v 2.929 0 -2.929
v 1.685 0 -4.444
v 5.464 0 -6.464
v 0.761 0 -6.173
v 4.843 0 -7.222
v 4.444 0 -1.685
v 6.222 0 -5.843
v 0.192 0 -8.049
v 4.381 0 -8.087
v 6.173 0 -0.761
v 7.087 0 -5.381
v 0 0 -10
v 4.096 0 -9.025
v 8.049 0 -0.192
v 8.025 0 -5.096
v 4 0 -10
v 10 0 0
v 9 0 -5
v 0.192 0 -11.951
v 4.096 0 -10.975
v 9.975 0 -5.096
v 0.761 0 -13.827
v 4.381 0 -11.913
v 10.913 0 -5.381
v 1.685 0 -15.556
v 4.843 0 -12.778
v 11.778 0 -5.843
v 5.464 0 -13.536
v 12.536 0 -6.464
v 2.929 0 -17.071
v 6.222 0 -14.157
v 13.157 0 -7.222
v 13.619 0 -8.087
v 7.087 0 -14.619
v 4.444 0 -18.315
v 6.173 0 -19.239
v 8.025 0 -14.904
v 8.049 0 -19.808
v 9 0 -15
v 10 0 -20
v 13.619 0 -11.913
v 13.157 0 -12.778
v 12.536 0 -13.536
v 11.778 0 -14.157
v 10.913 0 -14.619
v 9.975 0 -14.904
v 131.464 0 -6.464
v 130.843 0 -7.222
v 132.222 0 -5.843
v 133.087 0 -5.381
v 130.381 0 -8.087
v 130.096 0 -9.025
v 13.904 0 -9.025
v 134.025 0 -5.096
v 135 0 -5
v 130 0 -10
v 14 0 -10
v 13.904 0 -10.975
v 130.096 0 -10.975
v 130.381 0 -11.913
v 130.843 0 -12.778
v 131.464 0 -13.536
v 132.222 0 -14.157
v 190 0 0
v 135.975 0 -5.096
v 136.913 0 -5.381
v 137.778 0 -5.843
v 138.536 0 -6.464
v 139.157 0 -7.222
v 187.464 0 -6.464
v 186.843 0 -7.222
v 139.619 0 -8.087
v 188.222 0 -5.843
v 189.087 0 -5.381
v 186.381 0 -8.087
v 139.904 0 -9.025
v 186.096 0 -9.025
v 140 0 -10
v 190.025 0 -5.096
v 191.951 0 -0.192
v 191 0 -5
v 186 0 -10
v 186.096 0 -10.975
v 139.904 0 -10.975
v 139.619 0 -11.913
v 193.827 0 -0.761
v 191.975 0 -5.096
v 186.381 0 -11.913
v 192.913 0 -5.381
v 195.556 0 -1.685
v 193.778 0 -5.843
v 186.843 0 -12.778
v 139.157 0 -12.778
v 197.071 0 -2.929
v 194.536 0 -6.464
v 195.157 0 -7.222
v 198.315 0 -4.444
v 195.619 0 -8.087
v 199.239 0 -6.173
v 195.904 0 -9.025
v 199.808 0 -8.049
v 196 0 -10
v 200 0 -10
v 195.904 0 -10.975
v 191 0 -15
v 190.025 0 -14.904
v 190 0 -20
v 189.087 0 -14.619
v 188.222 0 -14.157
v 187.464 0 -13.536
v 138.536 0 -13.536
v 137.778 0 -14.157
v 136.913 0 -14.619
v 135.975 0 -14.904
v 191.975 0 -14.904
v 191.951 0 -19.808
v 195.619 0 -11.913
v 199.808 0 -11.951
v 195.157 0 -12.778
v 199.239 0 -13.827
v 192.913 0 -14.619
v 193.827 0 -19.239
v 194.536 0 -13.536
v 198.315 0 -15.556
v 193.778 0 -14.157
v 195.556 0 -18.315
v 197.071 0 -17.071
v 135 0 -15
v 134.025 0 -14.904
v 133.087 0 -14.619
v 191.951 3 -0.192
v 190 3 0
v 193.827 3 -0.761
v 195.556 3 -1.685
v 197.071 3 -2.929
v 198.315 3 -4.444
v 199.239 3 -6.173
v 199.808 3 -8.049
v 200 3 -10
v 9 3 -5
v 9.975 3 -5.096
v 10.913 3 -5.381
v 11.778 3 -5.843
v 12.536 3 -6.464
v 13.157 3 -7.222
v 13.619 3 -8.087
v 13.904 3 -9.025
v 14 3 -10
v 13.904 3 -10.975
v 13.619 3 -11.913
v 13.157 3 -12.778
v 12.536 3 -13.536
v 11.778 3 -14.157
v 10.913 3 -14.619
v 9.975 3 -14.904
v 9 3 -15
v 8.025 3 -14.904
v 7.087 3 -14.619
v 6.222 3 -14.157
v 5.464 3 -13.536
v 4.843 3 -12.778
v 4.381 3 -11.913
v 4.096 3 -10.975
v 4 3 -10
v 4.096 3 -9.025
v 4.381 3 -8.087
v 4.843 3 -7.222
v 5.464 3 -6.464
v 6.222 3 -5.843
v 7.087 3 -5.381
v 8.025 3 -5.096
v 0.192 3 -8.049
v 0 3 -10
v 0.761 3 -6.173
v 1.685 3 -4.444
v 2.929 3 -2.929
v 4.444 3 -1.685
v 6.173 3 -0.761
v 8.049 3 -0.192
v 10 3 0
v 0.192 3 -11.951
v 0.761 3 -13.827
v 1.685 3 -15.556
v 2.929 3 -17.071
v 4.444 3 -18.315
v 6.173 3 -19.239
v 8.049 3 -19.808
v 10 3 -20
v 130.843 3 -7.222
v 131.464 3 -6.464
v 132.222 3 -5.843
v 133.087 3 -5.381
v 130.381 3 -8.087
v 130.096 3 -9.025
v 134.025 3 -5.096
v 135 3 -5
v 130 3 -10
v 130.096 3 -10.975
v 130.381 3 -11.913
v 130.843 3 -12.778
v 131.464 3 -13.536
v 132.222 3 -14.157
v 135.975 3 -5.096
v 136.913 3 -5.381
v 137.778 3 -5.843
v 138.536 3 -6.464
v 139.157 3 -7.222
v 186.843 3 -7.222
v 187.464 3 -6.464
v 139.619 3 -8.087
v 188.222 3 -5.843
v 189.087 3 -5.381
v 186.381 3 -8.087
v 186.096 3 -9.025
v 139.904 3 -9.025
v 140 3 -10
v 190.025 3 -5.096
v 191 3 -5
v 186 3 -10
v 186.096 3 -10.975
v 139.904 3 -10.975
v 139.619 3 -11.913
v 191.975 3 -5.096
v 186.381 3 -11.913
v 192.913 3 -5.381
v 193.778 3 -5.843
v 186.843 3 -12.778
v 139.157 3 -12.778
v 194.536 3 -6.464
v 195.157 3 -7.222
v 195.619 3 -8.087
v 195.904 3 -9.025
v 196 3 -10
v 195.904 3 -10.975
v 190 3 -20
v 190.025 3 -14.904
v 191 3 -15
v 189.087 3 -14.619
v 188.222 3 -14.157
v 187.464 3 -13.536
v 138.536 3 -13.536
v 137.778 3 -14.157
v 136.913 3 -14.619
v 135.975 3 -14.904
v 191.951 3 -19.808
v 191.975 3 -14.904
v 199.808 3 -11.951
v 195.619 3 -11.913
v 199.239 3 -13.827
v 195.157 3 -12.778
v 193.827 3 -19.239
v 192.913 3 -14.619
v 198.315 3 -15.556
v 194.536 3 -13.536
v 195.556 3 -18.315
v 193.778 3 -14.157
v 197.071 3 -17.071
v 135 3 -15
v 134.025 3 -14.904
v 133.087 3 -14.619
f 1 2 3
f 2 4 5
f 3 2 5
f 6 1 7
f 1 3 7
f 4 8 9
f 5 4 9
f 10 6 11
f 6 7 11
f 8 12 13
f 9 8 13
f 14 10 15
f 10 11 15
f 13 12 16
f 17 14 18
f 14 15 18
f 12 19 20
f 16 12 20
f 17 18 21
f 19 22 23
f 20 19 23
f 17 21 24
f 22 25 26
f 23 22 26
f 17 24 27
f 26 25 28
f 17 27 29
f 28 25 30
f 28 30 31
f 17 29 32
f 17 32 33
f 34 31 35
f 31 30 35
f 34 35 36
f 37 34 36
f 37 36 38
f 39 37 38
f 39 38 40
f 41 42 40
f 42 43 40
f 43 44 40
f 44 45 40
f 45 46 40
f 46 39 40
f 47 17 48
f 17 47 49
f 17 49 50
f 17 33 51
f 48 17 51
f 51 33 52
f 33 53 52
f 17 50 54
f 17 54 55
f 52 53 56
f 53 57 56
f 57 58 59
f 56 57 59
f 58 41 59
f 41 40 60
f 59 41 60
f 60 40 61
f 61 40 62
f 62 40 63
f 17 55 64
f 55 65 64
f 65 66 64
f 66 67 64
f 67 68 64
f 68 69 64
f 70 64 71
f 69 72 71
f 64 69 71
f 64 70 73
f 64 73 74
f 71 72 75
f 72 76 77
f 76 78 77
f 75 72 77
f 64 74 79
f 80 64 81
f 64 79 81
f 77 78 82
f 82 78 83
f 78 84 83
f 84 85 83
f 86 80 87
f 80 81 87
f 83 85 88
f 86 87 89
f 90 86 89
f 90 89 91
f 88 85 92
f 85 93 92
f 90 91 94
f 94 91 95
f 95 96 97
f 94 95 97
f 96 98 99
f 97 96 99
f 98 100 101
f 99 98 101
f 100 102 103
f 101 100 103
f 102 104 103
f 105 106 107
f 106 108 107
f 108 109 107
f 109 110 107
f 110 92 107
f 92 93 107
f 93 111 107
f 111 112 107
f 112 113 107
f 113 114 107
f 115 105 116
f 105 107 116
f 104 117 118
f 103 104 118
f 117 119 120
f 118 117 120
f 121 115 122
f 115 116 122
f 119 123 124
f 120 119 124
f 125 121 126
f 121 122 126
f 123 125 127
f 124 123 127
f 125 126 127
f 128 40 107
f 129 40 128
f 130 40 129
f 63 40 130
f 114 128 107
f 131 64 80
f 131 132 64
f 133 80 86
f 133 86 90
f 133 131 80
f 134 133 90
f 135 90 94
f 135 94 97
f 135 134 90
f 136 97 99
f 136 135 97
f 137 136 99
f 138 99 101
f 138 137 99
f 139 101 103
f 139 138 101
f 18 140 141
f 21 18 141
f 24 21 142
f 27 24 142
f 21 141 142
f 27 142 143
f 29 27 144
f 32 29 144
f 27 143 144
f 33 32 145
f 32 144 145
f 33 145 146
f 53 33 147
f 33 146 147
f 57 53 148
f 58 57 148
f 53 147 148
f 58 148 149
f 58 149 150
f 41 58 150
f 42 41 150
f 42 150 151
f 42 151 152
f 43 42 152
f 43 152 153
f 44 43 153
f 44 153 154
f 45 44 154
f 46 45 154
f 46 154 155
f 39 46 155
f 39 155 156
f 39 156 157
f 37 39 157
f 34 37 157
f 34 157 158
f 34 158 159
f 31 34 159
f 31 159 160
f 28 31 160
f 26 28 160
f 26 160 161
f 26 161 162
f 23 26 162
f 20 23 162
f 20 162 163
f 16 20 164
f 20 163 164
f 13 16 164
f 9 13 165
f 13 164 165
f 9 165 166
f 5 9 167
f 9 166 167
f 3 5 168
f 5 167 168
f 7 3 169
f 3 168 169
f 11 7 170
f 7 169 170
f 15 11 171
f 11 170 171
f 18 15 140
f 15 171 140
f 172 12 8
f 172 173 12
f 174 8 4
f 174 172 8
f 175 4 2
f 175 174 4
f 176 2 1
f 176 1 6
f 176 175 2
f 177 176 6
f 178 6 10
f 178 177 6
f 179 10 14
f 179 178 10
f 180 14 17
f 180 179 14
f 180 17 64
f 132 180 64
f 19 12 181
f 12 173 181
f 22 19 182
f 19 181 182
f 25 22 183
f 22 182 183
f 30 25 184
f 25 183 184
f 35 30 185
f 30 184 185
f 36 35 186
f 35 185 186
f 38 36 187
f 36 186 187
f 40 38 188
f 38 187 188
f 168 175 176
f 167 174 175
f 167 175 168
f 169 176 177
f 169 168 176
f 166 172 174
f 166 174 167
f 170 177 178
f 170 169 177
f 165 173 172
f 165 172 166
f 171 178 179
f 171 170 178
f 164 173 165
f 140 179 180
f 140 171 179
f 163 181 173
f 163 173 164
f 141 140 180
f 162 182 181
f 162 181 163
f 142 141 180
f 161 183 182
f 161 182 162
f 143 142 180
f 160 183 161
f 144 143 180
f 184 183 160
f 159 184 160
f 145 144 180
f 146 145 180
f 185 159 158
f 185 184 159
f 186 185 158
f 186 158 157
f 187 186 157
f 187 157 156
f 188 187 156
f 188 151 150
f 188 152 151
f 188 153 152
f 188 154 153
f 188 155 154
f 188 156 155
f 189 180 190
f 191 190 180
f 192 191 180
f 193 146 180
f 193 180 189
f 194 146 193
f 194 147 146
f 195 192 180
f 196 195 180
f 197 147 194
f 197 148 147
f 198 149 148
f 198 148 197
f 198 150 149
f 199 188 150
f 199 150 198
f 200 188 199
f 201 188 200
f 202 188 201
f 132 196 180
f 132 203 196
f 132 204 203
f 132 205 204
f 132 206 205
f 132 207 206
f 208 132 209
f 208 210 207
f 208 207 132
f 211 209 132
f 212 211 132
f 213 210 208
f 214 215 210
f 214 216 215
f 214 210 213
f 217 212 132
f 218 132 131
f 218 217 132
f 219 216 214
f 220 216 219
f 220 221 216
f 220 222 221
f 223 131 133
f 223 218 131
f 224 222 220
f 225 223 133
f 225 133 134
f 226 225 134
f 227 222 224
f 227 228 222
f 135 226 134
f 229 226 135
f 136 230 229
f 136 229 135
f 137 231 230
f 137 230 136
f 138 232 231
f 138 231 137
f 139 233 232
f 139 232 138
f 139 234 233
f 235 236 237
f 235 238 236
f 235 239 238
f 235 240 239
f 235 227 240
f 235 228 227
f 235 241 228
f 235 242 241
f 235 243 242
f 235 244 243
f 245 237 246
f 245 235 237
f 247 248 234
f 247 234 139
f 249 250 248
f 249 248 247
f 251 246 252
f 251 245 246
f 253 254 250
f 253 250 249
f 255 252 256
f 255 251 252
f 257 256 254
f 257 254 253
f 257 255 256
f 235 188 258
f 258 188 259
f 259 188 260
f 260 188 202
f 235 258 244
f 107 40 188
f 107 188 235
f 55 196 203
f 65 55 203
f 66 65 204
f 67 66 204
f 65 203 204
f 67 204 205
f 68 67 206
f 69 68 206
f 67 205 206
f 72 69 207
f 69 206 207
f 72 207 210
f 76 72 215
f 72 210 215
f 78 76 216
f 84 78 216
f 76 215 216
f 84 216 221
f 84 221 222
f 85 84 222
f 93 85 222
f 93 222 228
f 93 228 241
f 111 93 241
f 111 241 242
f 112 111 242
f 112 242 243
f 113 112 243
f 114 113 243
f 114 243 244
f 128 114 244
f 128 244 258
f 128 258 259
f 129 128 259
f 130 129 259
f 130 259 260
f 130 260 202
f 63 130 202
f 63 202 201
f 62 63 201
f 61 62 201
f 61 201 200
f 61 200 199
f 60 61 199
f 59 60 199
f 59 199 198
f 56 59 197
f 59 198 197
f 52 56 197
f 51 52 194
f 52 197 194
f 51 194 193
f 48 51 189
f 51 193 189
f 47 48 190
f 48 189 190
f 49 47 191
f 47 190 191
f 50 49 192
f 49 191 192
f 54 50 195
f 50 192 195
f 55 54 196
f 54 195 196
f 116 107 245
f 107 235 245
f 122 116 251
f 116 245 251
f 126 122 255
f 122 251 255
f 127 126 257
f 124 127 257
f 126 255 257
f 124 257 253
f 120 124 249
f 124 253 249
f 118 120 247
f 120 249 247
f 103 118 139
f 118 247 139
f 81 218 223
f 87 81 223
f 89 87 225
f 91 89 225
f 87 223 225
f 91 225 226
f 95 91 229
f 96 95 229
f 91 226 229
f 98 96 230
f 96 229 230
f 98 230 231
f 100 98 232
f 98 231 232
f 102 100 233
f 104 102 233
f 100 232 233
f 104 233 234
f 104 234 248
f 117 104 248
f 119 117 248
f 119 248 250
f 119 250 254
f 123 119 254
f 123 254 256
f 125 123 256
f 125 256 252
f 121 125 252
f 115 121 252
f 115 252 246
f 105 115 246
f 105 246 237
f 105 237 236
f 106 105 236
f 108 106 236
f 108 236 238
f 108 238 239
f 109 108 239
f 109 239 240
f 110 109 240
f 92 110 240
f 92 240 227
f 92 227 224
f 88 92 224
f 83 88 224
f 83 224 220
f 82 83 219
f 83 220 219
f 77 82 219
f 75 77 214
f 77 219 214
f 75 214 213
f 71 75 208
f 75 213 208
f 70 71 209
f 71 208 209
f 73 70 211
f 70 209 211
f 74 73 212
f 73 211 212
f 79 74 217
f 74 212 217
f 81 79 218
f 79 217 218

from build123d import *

# Parameters (mm, degrees)
SKETCH2_W           = 200
SKETCH2_H           = 20
BOSS_EXTRUDE1_DEPTH = 3
SKETCH3_R           = 5
CUT_EXTRUDE1_DEPTH  = 202.019899512
SKETCH4_R           = 5
CUT_EXTRUDE2_DEPTH  = 202.019899512
FILLET1_R           = 10
FILLET2_R           = 10
SKETCH5_R           = 5
CUT_EXTRUDE3_DEPTH  = 202.019899512


with BuildPart() as part:
    # Sketch2 → Boss-Extrude1 (new body)
    with BuildSketch(Plane(origin=(0, 0, 0), x_dir=(1, 0, 0), z_dir=(0, 1, 0))):
        with Locations((100, 10)):
            Rectangle(SKETCH2_W, SKETCH2_H)
    extrude(amount=BOSS_EXTRUDE1_DEPTH)

    # Sketch3 → Cut-Extrude1 (cut, through all)
    with BuildSketch(Plane(origin=(0, 3, 0), x_dir=(1, 0, 0), z_dir=(0, 1, 0))):
        with Locations(Location((9, 10, 0), (0, 0, 270))):
            Circle(SKETCH3_R)
    extrude(amount=-CUT_EXTRUDE1_DEPTH, mode=Mode.SUBTRACT)

    # Sketch4 → Cut-Extrude2 (cut, through all)
    with BuildSketch(Plane(origin=(0, 3, 0), x_dir=(1, 0, 0), z_dir=(0, 1, 0))):
        with Locations(Location((191, 10, 0), (0, 0, 270))):
            Circle(SKETCH4_R)
    extrude(amount=-CUT_EXTRUDE2_DEPTH, mode=Mode.SUBTRACT)

    # Fillet1
    fillet1_edges = [part.edges().sort_by_distance(p)[0] for p in [
        (0, 1.5, -20),
        (0, 1.5, 0),
    ]]
    fillet(fillet1_edges, radius=FILLET1_R - 0.0001)  # a hair under: the kernel refuses the full size

    # Fillet2
    fillet2_edges = [part.edges().sort_by_distance(p)[0] for p in [
        (200, 1.5, -20),
        (200, 1.5, 0),
    ]]
    fillet(fillet2_edges, radius=FILLET2_R - 0.0001)  # a hair under: the kernel refuses the full size

    # Sketch5 → Cut-Extrude3 (cut, through all)
    with BuildSketch(Plane(origin=(0, 3, 0), x_dir=(1, 0, 0), z_dir=(0, 1, 0))):
        with Locations(Location((135, 10, 0), (0, 0, 270))):
            Circle(SKETCH5_R)
    extrude(amount=-CUT_EXTRUDE3_DEPTH, mode=Mode.SUBTRACT)


solid = part.part
